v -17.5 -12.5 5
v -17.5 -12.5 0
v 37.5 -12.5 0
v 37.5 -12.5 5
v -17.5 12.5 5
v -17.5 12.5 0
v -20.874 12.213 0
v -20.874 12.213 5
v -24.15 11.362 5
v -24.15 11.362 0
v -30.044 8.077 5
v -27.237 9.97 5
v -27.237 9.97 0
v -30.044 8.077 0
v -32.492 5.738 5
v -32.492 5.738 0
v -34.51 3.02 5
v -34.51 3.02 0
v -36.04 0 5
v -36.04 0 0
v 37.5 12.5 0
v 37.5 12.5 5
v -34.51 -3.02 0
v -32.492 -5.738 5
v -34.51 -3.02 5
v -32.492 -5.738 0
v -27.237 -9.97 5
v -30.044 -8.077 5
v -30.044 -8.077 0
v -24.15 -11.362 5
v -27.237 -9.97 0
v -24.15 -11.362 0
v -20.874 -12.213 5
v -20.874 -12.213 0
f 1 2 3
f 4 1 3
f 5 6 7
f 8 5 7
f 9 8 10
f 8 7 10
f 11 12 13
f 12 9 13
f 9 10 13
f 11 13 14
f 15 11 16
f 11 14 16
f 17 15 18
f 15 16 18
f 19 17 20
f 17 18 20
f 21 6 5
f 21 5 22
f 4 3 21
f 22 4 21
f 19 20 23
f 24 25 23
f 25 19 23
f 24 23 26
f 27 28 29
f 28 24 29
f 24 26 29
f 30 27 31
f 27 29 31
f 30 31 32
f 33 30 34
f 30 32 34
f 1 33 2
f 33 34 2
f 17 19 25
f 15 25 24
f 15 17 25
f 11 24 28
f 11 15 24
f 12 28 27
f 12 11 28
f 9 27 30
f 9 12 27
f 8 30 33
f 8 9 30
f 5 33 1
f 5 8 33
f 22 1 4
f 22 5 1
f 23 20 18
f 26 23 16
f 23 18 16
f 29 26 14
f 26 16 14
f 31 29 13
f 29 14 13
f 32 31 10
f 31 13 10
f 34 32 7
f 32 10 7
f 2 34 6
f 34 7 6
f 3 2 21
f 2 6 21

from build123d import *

# Parameters (mm, degrees)
F0_W        = 75
F0_H        = 25
F1_DEPTH    = 5
F2_T1_DEPTH = 105


# Not quite as in the source:
# - a fillet or chamfer that OpenCascade refuses, or shapes differently, is made with other operations: its cross-section is extruded or revolved along the edge and cut away or added


with BuildPart() as f1:
    # F0 (on Top) → F1 (new body)
    with BuildSketch(Plane.XY):
        Rectangle(F0_W, F0_H)
    extrude(amount=F1_DEPTH)

    # F2: fillet of radius 20 on 2 edges, made by hand

    # F2_s2 → F2_t1 (cut)
    with BuildSketch(Plane.XY.offset(-50)):
        with BuildLine():
            ThreePointArc((-17.5, 12.5), (-31.6421356237, 6.6421356237), (-37.5, -7.5))
            Line((-37.5, -7.5), (-37.5, 12.5))
            Line((-37.5, 12.5), (-17.5, 12.5))
        make_face()
        with BuildLine():
            ThreePointArc((-37.5, 7.5), (-31.6421356237, -6.6421356237), (-17.5, -12.5))
            Line((-17.5, -12.5), (-37.5, -12.5))
            Line((-37.5, -12.5), (-37.5, 7.5))
        make_face()
    extrude(amount=F2_T1_DEPTH, mode=Mode.SUBTRACT)


solid = f1.part
